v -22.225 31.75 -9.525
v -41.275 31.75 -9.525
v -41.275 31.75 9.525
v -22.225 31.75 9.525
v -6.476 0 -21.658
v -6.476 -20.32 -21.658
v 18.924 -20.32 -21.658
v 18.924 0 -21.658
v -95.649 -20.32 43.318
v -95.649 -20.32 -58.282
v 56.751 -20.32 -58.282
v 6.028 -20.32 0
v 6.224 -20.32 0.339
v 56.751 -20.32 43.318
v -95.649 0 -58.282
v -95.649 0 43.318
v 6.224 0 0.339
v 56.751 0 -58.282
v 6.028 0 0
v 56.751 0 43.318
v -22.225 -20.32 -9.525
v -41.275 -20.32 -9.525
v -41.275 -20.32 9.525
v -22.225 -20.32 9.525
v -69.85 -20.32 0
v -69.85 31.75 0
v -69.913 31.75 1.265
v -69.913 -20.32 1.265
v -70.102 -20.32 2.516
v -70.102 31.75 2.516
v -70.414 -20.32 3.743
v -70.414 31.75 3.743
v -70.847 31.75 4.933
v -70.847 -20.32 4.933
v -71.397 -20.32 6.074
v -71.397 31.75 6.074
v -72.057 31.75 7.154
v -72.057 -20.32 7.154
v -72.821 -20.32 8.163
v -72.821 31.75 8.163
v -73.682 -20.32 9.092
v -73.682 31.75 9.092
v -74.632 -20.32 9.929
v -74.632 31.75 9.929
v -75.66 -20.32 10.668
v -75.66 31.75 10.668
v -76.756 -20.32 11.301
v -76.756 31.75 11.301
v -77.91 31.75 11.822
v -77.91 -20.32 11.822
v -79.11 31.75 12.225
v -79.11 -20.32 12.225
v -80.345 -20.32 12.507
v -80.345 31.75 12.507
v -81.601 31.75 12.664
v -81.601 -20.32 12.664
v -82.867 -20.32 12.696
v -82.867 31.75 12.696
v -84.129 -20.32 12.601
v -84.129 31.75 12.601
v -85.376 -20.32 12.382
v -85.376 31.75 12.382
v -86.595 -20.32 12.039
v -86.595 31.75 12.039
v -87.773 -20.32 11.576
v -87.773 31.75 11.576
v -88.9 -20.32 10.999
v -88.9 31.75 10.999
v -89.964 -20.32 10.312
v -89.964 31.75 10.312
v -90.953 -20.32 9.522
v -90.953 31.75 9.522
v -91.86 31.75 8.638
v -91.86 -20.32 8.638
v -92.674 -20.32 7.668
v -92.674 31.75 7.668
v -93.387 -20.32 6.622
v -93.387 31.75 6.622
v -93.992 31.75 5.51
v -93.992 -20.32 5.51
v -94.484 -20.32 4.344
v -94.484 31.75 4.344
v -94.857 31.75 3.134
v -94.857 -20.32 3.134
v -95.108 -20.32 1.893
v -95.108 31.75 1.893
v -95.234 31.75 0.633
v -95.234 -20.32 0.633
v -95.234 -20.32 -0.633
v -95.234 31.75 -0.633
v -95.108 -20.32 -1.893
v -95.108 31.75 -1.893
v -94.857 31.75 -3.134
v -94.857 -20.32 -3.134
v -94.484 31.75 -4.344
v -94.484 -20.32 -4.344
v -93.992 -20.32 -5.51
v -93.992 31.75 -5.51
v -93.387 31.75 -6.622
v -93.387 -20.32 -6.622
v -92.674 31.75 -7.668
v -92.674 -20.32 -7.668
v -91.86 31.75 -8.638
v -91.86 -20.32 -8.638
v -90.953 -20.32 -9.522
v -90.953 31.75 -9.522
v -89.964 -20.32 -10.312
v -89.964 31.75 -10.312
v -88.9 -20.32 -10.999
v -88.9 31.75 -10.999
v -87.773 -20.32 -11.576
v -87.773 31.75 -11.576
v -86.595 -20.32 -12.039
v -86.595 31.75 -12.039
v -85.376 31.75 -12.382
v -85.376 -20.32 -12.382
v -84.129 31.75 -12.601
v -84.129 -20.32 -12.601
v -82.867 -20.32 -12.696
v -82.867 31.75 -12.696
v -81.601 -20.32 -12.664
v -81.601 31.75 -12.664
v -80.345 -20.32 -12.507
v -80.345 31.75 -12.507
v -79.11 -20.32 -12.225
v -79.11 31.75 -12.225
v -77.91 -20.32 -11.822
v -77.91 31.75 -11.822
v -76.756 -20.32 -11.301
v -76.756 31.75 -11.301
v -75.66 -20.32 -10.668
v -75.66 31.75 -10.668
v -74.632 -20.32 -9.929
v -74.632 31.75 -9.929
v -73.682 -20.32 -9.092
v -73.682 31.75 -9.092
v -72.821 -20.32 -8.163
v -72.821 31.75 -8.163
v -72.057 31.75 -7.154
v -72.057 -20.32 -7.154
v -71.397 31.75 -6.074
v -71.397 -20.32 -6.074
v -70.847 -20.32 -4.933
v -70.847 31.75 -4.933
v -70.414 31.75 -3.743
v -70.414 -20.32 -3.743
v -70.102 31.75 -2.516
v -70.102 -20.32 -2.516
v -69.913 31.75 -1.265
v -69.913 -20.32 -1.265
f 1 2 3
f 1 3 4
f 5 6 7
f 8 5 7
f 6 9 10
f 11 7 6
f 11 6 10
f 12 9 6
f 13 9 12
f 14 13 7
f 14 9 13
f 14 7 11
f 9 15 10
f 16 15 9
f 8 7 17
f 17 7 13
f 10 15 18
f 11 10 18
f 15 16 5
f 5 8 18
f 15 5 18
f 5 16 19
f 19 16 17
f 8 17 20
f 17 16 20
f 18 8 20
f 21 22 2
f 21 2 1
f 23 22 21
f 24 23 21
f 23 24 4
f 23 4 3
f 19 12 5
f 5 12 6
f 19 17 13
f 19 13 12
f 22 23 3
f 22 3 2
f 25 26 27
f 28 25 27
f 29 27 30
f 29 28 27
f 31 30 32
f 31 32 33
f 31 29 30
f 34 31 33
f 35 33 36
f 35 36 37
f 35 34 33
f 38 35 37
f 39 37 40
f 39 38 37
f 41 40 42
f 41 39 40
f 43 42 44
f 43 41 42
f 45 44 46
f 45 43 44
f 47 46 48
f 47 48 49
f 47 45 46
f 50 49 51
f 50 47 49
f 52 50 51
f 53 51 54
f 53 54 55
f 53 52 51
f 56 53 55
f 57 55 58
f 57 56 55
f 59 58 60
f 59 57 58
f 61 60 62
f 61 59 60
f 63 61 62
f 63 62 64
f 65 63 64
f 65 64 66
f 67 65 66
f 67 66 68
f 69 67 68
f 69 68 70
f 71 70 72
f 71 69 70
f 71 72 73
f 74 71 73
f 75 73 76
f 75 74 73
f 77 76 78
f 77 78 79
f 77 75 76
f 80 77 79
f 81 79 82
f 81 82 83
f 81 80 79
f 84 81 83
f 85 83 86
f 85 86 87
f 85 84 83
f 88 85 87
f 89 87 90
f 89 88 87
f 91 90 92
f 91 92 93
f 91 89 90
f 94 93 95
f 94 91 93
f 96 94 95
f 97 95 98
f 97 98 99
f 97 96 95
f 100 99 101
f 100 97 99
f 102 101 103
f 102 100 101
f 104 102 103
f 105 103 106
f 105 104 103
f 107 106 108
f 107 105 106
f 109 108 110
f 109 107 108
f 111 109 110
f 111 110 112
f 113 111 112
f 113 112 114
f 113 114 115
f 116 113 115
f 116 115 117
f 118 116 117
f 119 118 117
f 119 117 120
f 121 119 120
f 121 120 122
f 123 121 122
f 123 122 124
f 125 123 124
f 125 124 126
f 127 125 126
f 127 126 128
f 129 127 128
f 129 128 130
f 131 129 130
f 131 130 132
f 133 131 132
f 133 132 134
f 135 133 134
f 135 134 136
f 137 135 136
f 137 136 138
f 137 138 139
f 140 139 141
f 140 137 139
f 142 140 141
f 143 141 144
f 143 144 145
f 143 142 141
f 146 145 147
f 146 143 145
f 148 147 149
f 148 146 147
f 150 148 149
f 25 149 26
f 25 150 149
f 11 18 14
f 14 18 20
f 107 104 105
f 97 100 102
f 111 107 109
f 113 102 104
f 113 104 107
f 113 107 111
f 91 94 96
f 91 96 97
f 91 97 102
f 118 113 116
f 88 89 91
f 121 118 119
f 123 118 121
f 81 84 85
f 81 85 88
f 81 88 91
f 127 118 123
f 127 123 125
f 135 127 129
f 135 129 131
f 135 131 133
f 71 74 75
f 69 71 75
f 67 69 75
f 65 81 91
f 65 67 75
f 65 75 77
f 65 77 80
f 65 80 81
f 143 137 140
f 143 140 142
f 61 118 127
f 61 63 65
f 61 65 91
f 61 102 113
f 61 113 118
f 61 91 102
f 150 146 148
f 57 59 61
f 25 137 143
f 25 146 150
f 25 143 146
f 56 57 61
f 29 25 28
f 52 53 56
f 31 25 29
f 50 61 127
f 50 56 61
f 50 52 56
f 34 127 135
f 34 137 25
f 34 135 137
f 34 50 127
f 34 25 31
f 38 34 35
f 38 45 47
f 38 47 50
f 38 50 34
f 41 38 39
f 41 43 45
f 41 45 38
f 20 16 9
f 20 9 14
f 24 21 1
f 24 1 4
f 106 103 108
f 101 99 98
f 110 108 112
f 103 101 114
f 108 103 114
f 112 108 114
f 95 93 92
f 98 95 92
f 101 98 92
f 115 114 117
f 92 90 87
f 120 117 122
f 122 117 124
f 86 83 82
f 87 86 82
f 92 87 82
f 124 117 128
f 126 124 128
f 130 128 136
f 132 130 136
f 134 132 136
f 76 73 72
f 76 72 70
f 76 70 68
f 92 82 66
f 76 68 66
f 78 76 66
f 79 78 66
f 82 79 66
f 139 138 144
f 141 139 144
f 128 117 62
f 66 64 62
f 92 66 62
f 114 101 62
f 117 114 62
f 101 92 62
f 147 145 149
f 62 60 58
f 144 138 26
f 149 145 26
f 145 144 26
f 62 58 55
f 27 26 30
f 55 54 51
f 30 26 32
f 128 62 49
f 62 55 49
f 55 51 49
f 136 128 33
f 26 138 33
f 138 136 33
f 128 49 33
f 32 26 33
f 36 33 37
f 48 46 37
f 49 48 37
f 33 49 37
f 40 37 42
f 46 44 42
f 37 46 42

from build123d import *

# Parameters (mm, degrees)
F0_W     = 152.4
F0_H     = 101.6
F1_DEPTH = 20.32
F2_R     = 12.7
F3_DEPTH = 52.07
F4_DEPTH = 25.4


with BuildPart() as f1:
    # F0 (on Front) → F1 (new body)
    with BuildSketch(Plane.XZ):
        with Locations((-19.449437, -7.481951)):
            Rectangle(F0_W, F0_H)
    extrude(amount=F1_DEPTH)

    # F2 (on face) → F4 (cut)
    with BuildSketch(Plane.XZ.offset(20.32)):
        Polygon((6.224167, 0.339493), (6.02816, 0), (-6.475833, -21.657552), (18.924167, -21.657552), align=None)
    extrude(amount=-F4_DEPTH, mode=Mode.SUBTRACT)


with BuildPart() as f3:
    # F2 (on face) → F3 (new body)
    with BuildSketch(Plane.XZ.offset(20.32)):
        with Locations((-82.55, 0)):
            Circle(F2_R)
        Polygon((-22.225, -9.525), (-22.225, 0), (-31.75, 0), (-41.275, 0), (-41.275, -9.525), align=None)
        Polygon((-31.75, 0), (-22.225, 0), (-22.225, 9.525), (-41.275, 9.525), (-41.275, 0), align=None)
    extrude(amount=-F3_DEPTH)


solid = Compound([f1.part, f3.part])
